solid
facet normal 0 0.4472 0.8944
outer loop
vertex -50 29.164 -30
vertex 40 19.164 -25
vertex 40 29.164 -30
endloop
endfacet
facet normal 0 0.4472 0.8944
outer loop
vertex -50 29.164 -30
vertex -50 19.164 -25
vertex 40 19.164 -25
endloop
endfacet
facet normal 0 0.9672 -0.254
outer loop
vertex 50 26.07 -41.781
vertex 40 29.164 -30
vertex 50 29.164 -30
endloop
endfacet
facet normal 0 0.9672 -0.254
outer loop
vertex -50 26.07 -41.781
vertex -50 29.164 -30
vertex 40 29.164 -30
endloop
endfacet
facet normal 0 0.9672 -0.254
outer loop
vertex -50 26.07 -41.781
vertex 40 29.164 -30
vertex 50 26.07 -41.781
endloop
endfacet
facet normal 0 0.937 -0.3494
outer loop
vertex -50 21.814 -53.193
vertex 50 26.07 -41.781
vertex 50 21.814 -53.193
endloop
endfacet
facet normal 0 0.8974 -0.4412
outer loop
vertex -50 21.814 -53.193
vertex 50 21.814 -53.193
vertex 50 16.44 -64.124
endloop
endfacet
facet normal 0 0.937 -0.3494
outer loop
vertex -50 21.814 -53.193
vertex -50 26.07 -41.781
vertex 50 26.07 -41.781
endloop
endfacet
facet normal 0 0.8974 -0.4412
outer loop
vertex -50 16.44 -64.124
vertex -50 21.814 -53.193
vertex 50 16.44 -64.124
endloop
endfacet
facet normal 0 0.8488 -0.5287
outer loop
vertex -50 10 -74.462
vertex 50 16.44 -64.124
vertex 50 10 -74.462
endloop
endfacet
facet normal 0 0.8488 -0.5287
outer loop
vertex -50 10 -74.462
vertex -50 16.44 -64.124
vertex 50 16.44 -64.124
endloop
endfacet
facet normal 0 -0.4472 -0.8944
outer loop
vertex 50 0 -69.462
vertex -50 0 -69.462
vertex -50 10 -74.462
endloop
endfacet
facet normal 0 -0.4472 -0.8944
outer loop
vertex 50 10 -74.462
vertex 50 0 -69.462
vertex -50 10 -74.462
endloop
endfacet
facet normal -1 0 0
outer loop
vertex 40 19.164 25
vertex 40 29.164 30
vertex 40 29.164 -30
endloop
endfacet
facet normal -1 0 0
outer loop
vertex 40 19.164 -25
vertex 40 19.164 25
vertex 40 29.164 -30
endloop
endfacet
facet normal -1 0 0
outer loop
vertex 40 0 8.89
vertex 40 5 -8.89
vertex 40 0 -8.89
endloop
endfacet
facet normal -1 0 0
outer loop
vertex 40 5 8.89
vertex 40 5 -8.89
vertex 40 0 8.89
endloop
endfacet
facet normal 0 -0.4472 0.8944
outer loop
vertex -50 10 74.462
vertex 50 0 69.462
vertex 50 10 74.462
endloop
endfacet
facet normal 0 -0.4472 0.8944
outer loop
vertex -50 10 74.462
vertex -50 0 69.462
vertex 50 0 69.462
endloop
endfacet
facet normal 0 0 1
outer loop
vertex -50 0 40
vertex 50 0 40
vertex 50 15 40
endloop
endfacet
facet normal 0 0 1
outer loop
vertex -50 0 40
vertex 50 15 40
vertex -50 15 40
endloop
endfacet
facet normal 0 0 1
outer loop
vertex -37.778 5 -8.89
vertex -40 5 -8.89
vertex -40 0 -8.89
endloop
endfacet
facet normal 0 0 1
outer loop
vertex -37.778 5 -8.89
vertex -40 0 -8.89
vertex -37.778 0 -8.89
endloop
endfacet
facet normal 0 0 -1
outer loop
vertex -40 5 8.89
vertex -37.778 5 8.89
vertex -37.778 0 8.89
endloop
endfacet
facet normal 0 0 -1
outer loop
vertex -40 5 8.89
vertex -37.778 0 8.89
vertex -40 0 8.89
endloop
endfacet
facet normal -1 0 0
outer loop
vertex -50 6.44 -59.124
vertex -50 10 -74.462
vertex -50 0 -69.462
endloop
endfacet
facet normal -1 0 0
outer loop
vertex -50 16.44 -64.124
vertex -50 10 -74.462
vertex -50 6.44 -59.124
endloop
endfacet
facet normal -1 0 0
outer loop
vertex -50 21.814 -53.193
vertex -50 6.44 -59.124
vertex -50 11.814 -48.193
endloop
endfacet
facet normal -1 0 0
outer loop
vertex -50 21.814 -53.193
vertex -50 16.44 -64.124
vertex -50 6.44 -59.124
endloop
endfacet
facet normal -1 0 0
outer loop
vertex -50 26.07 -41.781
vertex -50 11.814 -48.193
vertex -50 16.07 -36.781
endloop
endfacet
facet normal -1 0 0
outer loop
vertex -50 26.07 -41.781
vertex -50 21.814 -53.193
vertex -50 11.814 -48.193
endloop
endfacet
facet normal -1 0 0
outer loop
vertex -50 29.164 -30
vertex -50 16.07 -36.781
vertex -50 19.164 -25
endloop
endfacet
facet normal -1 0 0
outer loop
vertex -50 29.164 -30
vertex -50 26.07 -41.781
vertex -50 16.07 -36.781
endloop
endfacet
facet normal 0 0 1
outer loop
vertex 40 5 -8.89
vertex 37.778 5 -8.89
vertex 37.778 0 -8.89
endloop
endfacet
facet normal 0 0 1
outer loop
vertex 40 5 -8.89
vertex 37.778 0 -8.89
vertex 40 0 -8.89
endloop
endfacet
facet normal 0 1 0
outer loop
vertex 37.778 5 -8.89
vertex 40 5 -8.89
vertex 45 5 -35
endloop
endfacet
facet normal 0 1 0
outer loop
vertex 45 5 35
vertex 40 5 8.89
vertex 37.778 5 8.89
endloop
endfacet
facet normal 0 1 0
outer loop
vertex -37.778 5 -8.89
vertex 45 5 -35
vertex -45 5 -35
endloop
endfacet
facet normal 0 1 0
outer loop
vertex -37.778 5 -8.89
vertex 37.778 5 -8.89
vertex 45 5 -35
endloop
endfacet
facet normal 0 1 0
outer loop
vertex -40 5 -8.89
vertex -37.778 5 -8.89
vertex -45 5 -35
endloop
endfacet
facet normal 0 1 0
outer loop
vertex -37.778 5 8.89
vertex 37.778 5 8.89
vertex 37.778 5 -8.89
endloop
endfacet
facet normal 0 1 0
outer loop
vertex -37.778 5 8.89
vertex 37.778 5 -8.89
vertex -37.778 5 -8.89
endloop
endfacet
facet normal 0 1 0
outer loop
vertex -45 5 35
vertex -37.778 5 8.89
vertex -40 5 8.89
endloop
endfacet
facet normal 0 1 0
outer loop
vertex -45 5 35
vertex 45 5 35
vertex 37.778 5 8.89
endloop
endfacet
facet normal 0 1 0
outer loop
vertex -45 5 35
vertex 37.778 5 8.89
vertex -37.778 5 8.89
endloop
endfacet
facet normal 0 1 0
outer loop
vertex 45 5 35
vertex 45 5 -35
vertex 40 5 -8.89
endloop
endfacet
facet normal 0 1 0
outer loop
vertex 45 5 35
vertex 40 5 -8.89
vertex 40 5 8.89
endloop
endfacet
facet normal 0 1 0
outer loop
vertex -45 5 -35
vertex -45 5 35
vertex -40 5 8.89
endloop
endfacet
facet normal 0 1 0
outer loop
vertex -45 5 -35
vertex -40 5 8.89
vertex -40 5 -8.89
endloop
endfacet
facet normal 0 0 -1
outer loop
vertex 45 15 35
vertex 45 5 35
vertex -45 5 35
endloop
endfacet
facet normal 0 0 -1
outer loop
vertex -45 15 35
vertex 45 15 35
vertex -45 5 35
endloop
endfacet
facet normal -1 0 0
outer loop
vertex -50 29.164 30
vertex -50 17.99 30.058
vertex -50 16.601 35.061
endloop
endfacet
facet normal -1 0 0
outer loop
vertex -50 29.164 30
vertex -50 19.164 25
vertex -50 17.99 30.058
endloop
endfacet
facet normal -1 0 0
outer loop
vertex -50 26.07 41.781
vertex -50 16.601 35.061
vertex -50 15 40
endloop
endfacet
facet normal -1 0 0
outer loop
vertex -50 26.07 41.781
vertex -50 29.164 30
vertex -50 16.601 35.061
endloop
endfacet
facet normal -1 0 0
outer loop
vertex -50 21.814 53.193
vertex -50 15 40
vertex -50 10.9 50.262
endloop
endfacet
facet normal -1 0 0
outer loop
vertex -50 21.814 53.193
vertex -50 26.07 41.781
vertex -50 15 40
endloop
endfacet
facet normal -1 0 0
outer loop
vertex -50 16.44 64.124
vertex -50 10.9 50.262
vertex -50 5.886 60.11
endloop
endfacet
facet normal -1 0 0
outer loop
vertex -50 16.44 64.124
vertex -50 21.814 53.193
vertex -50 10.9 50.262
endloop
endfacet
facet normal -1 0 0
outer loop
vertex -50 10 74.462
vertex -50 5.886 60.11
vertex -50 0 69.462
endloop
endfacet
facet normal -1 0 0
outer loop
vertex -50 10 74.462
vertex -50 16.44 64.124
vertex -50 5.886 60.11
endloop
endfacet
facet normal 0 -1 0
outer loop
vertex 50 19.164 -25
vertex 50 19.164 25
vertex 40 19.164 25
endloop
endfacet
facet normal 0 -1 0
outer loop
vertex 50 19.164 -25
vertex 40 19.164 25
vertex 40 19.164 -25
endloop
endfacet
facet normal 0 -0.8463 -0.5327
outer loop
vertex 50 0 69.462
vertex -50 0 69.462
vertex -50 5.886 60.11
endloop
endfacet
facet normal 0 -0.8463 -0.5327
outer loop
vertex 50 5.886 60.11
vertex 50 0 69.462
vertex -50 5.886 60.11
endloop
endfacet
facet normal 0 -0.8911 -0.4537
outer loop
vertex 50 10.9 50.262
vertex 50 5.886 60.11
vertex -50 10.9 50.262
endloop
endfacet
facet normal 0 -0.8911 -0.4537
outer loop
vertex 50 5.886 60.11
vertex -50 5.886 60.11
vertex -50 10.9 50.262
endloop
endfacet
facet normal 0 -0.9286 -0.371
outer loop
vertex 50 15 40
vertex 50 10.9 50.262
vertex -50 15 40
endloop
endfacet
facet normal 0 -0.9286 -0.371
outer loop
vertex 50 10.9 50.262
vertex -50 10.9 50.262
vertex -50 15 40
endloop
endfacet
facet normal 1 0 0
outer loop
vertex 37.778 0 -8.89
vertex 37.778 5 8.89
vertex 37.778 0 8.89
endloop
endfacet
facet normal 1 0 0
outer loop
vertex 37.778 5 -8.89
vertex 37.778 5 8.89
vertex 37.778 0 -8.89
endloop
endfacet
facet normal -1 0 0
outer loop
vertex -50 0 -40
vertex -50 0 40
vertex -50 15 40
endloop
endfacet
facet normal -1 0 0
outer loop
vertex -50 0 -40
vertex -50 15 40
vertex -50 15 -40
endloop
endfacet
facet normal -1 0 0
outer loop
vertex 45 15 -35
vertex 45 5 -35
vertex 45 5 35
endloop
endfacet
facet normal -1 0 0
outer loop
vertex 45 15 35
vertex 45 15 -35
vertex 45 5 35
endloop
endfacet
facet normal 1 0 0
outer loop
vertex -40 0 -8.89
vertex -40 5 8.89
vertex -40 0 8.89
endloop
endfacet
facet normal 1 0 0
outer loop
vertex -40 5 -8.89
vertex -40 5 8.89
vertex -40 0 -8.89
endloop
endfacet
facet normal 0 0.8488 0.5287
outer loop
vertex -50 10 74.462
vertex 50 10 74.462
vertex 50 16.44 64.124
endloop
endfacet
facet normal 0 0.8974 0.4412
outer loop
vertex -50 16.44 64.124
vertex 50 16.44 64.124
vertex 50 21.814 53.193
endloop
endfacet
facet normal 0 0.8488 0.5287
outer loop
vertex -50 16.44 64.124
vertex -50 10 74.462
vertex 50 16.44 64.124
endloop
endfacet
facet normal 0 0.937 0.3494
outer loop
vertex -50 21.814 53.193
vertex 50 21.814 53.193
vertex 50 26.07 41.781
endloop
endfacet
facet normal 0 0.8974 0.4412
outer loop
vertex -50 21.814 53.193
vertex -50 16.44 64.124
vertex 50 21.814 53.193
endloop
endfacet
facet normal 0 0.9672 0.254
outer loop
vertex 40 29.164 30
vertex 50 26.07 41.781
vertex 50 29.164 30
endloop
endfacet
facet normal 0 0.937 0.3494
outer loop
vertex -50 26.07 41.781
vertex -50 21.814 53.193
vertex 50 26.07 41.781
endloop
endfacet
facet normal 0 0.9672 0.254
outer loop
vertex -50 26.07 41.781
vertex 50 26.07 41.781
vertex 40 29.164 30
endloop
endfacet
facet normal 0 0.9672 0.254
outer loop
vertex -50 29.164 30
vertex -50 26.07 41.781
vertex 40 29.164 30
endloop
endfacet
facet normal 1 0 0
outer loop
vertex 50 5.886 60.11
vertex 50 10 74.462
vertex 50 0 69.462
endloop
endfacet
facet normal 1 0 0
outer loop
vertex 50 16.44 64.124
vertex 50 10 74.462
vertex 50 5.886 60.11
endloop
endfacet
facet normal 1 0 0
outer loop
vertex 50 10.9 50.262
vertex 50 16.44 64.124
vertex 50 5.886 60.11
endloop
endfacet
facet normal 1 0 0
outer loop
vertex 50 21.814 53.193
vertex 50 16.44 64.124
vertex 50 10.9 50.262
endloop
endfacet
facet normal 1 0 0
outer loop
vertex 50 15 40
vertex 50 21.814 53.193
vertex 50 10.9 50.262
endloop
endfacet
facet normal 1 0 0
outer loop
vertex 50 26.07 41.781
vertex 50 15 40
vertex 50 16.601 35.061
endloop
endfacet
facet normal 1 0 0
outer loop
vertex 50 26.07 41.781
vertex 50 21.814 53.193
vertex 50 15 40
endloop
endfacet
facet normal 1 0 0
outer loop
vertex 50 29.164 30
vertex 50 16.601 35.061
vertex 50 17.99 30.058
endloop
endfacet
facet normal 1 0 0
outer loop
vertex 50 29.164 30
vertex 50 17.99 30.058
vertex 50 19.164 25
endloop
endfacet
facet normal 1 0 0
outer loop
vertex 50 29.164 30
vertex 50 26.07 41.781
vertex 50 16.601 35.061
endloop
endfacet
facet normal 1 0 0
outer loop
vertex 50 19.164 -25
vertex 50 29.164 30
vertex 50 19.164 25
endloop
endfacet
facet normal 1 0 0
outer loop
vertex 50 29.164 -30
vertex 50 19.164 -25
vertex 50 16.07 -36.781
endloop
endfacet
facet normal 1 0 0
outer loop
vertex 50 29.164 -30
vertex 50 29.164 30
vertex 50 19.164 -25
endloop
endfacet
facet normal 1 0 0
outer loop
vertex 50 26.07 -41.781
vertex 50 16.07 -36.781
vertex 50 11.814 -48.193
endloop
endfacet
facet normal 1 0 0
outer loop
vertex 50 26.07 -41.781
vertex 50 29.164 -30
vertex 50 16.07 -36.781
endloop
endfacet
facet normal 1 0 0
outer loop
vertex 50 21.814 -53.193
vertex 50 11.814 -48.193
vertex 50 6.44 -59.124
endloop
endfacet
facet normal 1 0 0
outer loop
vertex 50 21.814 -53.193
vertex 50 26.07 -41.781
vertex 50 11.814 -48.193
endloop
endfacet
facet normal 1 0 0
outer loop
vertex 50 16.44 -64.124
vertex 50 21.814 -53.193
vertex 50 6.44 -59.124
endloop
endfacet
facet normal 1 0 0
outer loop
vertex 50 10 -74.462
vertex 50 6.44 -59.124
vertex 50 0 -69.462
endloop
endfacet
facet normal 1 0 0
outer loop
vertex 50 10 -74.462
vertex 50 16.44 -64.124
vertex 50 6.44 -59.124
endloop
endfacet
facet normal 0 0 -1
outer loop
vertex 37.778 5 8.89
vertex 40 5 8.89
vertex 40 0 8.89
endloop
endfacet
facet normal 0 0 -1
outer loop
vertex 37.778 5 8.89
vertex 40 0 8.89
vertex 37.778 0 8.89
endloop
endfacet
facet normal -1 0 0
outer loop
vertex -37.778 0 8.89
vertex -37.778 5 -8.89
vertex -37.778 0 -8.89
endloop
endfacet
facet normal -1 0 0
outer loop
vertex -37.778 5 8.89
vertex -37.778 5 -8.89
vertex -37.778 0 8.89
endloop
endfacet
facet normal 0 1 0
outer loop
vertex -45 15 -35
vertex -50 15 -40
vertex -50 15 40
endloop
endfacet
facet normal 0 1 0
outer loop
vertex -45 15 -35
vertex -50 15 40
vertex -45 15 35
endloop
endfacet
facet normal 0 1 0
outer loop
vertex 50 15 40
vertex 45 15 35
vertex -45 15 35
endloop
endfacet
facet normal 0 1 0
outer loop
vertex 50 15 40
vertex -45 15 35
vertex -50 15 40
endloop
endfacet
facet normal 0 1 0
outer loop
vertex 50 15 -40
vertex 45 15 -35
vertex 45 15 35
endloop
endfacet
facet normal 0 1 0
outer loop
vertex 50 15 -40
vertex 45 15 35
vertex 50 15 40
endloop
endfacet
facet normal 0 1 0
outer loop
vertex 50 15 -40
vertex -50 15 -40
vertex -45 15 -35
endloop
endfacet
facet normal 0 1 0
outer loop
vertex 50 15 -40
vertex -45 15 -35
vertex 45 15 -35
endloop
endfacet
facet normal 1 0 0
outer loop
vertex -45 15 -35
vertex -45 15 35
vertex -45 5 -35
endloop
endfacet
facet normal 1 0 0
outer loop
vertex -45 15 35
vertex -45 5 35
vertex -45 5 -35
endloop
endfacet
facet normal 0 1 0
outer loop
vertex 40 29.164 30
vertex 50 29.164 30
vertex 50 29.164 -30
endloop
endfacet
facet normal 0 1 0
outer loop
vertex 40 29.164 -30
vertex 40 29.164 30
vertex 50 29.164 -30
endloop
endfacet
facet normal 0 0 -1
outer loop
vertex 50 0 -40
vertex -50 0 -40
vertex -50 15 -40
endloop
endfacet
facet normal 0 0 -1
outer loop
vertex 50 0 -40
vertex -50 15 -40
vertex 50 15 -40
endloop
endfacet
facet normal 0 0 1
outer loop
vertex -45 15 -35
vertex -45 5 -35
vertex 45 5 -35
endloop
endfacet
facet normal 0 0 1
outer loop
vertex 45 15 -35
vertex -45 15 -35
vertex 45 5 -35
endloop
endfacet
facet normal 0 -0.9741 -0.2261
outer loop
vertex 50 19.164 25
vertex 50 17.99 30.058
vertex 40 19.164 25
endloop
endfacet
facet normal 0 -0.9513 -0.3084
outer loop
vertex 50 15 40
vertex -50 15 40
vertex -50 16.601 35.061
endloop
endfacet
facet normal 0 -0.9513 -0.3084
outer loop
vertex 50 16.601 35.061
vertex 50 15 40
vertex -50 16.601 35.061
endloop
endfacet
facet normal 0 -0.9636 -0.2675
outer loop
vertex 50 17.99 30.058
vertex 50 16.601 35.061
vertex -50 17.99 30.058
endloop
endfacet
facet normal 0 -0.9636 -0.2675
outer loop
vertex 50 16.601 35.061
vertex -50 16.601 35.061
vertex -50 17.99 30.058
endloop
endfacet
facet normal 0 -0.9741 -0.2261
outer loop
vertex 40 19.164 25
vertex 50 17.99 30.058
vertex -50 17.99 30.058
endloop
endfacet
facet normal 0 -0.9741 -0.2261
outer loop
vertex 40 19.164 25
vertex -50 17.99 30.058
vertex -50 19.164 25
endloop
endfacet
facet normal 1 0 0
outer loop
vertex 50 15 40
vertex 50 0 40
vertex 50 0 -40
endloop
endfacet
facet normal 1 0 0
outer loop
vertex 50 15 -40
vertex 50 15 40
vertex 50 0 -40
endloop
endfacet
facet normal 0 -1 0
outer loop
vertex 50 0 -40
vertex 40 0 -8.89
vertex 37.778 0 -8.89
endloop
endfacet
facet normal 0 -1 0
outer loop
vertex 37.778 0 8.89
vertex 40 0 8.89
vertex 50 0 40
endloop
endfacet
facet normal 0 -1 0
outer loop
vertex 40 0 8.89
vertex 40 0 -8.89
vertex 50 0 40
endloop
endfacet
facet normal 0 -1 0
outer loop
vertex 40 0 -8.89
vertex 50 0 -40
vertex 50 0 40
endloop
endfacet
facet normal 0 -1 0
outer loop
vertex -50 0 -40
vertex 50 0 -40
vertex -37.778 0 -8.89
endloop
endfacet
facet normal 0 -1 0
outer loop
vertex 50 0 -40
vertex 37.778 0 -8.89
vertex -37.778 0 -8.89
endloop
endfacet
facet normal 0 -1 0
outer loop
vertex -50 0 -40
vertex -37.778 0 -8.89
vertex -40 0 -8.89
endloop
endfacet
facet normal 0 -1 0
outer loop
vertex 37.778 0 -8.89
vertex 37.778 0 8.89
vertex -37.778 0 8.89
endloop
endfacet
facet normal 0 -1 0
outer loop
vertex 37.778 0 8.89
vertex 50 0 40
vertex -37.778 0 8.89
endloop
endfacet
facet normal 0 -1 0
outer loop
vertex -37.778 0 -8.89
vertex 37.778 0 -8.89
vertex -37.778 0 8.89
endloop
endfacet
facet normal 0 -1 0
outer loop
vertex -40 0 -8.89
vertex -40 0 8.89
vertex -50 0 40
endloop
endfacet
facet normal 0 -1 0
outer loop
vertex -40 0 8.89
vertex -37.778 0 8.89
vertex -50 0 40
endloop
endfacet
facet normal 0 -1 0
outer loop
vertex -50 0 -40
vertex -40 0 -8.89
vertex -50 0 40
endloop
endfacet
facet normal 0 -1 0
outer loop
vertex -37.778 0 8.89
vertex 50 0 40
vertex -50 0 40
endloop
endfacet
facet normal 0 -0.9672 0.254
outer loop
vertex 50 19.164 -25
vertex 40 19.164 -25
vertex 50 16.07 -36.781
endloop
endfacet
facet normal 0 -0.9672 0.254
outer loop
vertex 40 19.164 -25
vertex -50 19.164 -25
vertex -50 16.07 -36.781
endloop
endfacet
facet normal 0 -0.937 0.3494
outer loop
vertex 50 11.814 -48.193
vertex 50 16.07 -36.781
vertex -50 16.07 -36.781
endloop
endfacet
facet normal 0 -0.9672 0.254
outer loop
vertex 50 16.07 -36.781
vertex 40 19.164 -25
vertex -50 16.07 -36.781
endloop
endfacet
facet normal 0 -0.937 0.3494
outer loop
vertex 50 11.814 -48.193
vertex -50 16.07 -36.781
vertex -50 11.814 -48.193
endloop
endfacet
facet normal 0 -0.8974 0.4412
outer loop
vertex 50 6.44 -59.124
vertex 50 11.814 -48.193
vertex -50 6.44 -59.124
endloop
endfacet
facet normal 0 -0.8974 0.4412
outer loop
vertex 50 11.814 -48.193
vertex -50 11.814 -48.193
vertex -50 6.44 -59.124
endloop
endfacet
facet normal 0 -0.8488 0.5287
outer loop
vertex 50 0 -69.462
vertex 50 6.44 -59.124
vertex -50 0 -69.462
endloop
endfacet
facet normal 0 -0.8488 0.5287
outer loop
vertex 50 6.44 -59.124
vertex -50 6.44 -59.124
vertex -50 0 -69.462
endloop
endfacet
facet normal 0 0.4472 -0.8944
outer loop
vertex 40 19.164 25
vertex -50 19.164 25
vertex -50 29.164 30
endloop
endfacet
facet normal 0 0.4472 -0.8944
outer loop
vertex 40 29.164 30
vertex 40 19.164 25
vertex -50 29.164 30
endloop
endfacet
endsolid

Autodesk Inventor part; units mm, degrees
ref_plane "YZ Plane" through (0, 0, 0) normal (1, 0, 0) x (0, 1, 0)
ref_plane "XZ Plane" through (0, 0, 0) normal (0, 1, 0) x (-1, 0, 0)
ref_plane "XY Plane" through (0, 0, 0) normal (0, 0, 1) x (1, 0, 0)
sketch "Sketch1" plane through (0, 0, 0) normal (0, 1, 0) x (-1, 0, 0)
  line L0 (50, 40) -> (-50, 40)
  line L1 (-50, 40) -> (-50, -40)
  line L2 (-50, -40) -> (50, -40)
  line L3 (50, -40) -> (50, 40)
  point P0 (0, 0)
  dimension "d0" = 40
  dimension "d1" = 80
  dimension "d2" = 100
  dimension "d3" = 50
extrude "Extrusion1" add sketch "Sketch1" along normal blind 5
sketch "Sketch2" plane through (0, 5, 0) normal (0, 1, 0) x (1, 0, 0)
  line L0 (40, -8.89) -> (37.7775, -8.89)
  line L1 (37.7775, -8.89) -> (37.7775, 8.89)
  line L2 (37.7775, 8.89) -> (40, 8.89)
  line L3 (40, 8.89) -> (40, -8.89)
  line L4 (50, -40) -> (50, 40) projected
  point P0 (0, 0)
  point P1 (38.8888, -8.89)
  point P2 (38.8887, 8.89)
  point P3 (50, 0)
  point P4 (40, 0)
  dimension "d6" = 17.78
  dimension "d7" = 8.89
  dimension "d8" = 10
  dimension "d9" = 2.2225
extrude "Extrusion2" cut sketch "Sketch2" against normal through all
sketch "Sketch3" plane through (0, 5, 0) normal (0, 1, 0) x (1, 0, 0)
  line L0 (-37.7775, -8.89) -> (-40, -8.89)
  line L1 (-40, -8.89) -> (-40, 8.89)
  line L2 (-40, 8.89) -> (-37.7775, 8.89)
  line L3 (-37.7775, 8.89) -> (-37.7775, -8.89)
  line L4 (-50, 40) -> (-50, -40) projected
  point P0 (0, 0)
  point P1 (-38.8887, -8.89)
  point P2 (-38.8887, 8.89)
  point P3 (-40, 0)
  dimension "d12" = 2.2225
  dimension "d13" = 8.89
  dimension "d14" = 17.78
  dimension "d15" = 10
extrude "Extrusion3" cut sketch "Sketch3" against normal through all
sketch "Sketch4" plane through (0, 5, 0) normal (0, 1, 0) x (1, 0, 0)
  line L0 (50, -40) -> (50, 40) projected
  line L1 (45, -35) -> (-45, -35)
  line L2 (-45, -35) -> (-45, 35)
  line L3 (-45, 35) -> (45, 35)
  line L4 (45, 35) -> (45, -35)
  line L5 (50, -40) -> (-50, -40)
  line L6 (-50, -40) -> (-50, 40)
  line L7 (-50, 40) -> (50, 40)
  line L8 (50, 40) -> (50, -40)
  dimension "d19" = 5
  dimension "d20" = 5
  dimension "d21" = 5
  dimension "d22" = 5
extrude "Extrusion4" add sketch "Sketch4" along normal blind 10
sketch "Sketch5" plane through (-50, 0, -40) normal (-1, 0, 0) x (0, 0, 1)
  line L0 (0, 0) -> (80, 0) projected
  line L1 (75, 15) -> (5, 15) projected
  arc A0 (109.4622, 0) -> (65, 19.1638) centre (40, -100) ccw
  arc A1 (15, 19.1638) -> (-29.4622, 0) centre (40, -100) ccw
  line L2 (15, 19.1638) -> (10, 29.1638)
  arc A2 (10, 29.1638) -> (-34.4622, 10) centre (35, -90) ccw
  line L3 (-29.4622, 0) -> (-34.4622, 10)
  arc A3 (114.4622, 10) -> (70, 29.1638) centre (45, -90) ccw
  line L4 (65, 19.1638) -> (70, 29.1638)
  line L5 (109.4622, 0) -> (114.4622, 10)
  point P0 (40, 0)
  point P1 (80, -100)
  point P2 (80, 15)
  point P3 (0, 15)
  point P4 (-5, 25)
  point P5 (85, 25)
  dimension "d25" = 100
  dimension "d26" = 100
  dimension "d27" = 15
  dimension "d28" = 15
  dimension "d29" = 15
  dimension "d30" = 10
  dimension "d31" = 5
  dimension "d32" = 5
  dimension "d33" = 15
  dimension "d34" = 10
  dimension "d35" = 10
  dimension "d36" = 10
  dimension "d37" = 10
  dimension "d38" = 5
extrude "Extrusion5" add sketch "Sketch5" against normal blind 100
sketch "Sketch6" plane through (50, 0, 40) normal (1, 0, 0) x (0, 0, -1)
  arc A0 (114.4622, 10) -> (70, 29.1638) centre (45, -90) ccw projected
  line L0 (10, 29.1638) -> (70, 29.1638)
  arc A1 (80, 15) -> (65, 19.1638) centre (40, -100) ccw projected
  line L1 (15, 19.1638) -> (65, 19.1638)
  line L2 (65, 19.1638) -> (70, 29.1638)
  line L3 (15, 19.1638) -> (10, 29.1638)
  point P0 (40, 0)
extrude "Extrusion6" add sketch "Sketch6" against normal blind 10
